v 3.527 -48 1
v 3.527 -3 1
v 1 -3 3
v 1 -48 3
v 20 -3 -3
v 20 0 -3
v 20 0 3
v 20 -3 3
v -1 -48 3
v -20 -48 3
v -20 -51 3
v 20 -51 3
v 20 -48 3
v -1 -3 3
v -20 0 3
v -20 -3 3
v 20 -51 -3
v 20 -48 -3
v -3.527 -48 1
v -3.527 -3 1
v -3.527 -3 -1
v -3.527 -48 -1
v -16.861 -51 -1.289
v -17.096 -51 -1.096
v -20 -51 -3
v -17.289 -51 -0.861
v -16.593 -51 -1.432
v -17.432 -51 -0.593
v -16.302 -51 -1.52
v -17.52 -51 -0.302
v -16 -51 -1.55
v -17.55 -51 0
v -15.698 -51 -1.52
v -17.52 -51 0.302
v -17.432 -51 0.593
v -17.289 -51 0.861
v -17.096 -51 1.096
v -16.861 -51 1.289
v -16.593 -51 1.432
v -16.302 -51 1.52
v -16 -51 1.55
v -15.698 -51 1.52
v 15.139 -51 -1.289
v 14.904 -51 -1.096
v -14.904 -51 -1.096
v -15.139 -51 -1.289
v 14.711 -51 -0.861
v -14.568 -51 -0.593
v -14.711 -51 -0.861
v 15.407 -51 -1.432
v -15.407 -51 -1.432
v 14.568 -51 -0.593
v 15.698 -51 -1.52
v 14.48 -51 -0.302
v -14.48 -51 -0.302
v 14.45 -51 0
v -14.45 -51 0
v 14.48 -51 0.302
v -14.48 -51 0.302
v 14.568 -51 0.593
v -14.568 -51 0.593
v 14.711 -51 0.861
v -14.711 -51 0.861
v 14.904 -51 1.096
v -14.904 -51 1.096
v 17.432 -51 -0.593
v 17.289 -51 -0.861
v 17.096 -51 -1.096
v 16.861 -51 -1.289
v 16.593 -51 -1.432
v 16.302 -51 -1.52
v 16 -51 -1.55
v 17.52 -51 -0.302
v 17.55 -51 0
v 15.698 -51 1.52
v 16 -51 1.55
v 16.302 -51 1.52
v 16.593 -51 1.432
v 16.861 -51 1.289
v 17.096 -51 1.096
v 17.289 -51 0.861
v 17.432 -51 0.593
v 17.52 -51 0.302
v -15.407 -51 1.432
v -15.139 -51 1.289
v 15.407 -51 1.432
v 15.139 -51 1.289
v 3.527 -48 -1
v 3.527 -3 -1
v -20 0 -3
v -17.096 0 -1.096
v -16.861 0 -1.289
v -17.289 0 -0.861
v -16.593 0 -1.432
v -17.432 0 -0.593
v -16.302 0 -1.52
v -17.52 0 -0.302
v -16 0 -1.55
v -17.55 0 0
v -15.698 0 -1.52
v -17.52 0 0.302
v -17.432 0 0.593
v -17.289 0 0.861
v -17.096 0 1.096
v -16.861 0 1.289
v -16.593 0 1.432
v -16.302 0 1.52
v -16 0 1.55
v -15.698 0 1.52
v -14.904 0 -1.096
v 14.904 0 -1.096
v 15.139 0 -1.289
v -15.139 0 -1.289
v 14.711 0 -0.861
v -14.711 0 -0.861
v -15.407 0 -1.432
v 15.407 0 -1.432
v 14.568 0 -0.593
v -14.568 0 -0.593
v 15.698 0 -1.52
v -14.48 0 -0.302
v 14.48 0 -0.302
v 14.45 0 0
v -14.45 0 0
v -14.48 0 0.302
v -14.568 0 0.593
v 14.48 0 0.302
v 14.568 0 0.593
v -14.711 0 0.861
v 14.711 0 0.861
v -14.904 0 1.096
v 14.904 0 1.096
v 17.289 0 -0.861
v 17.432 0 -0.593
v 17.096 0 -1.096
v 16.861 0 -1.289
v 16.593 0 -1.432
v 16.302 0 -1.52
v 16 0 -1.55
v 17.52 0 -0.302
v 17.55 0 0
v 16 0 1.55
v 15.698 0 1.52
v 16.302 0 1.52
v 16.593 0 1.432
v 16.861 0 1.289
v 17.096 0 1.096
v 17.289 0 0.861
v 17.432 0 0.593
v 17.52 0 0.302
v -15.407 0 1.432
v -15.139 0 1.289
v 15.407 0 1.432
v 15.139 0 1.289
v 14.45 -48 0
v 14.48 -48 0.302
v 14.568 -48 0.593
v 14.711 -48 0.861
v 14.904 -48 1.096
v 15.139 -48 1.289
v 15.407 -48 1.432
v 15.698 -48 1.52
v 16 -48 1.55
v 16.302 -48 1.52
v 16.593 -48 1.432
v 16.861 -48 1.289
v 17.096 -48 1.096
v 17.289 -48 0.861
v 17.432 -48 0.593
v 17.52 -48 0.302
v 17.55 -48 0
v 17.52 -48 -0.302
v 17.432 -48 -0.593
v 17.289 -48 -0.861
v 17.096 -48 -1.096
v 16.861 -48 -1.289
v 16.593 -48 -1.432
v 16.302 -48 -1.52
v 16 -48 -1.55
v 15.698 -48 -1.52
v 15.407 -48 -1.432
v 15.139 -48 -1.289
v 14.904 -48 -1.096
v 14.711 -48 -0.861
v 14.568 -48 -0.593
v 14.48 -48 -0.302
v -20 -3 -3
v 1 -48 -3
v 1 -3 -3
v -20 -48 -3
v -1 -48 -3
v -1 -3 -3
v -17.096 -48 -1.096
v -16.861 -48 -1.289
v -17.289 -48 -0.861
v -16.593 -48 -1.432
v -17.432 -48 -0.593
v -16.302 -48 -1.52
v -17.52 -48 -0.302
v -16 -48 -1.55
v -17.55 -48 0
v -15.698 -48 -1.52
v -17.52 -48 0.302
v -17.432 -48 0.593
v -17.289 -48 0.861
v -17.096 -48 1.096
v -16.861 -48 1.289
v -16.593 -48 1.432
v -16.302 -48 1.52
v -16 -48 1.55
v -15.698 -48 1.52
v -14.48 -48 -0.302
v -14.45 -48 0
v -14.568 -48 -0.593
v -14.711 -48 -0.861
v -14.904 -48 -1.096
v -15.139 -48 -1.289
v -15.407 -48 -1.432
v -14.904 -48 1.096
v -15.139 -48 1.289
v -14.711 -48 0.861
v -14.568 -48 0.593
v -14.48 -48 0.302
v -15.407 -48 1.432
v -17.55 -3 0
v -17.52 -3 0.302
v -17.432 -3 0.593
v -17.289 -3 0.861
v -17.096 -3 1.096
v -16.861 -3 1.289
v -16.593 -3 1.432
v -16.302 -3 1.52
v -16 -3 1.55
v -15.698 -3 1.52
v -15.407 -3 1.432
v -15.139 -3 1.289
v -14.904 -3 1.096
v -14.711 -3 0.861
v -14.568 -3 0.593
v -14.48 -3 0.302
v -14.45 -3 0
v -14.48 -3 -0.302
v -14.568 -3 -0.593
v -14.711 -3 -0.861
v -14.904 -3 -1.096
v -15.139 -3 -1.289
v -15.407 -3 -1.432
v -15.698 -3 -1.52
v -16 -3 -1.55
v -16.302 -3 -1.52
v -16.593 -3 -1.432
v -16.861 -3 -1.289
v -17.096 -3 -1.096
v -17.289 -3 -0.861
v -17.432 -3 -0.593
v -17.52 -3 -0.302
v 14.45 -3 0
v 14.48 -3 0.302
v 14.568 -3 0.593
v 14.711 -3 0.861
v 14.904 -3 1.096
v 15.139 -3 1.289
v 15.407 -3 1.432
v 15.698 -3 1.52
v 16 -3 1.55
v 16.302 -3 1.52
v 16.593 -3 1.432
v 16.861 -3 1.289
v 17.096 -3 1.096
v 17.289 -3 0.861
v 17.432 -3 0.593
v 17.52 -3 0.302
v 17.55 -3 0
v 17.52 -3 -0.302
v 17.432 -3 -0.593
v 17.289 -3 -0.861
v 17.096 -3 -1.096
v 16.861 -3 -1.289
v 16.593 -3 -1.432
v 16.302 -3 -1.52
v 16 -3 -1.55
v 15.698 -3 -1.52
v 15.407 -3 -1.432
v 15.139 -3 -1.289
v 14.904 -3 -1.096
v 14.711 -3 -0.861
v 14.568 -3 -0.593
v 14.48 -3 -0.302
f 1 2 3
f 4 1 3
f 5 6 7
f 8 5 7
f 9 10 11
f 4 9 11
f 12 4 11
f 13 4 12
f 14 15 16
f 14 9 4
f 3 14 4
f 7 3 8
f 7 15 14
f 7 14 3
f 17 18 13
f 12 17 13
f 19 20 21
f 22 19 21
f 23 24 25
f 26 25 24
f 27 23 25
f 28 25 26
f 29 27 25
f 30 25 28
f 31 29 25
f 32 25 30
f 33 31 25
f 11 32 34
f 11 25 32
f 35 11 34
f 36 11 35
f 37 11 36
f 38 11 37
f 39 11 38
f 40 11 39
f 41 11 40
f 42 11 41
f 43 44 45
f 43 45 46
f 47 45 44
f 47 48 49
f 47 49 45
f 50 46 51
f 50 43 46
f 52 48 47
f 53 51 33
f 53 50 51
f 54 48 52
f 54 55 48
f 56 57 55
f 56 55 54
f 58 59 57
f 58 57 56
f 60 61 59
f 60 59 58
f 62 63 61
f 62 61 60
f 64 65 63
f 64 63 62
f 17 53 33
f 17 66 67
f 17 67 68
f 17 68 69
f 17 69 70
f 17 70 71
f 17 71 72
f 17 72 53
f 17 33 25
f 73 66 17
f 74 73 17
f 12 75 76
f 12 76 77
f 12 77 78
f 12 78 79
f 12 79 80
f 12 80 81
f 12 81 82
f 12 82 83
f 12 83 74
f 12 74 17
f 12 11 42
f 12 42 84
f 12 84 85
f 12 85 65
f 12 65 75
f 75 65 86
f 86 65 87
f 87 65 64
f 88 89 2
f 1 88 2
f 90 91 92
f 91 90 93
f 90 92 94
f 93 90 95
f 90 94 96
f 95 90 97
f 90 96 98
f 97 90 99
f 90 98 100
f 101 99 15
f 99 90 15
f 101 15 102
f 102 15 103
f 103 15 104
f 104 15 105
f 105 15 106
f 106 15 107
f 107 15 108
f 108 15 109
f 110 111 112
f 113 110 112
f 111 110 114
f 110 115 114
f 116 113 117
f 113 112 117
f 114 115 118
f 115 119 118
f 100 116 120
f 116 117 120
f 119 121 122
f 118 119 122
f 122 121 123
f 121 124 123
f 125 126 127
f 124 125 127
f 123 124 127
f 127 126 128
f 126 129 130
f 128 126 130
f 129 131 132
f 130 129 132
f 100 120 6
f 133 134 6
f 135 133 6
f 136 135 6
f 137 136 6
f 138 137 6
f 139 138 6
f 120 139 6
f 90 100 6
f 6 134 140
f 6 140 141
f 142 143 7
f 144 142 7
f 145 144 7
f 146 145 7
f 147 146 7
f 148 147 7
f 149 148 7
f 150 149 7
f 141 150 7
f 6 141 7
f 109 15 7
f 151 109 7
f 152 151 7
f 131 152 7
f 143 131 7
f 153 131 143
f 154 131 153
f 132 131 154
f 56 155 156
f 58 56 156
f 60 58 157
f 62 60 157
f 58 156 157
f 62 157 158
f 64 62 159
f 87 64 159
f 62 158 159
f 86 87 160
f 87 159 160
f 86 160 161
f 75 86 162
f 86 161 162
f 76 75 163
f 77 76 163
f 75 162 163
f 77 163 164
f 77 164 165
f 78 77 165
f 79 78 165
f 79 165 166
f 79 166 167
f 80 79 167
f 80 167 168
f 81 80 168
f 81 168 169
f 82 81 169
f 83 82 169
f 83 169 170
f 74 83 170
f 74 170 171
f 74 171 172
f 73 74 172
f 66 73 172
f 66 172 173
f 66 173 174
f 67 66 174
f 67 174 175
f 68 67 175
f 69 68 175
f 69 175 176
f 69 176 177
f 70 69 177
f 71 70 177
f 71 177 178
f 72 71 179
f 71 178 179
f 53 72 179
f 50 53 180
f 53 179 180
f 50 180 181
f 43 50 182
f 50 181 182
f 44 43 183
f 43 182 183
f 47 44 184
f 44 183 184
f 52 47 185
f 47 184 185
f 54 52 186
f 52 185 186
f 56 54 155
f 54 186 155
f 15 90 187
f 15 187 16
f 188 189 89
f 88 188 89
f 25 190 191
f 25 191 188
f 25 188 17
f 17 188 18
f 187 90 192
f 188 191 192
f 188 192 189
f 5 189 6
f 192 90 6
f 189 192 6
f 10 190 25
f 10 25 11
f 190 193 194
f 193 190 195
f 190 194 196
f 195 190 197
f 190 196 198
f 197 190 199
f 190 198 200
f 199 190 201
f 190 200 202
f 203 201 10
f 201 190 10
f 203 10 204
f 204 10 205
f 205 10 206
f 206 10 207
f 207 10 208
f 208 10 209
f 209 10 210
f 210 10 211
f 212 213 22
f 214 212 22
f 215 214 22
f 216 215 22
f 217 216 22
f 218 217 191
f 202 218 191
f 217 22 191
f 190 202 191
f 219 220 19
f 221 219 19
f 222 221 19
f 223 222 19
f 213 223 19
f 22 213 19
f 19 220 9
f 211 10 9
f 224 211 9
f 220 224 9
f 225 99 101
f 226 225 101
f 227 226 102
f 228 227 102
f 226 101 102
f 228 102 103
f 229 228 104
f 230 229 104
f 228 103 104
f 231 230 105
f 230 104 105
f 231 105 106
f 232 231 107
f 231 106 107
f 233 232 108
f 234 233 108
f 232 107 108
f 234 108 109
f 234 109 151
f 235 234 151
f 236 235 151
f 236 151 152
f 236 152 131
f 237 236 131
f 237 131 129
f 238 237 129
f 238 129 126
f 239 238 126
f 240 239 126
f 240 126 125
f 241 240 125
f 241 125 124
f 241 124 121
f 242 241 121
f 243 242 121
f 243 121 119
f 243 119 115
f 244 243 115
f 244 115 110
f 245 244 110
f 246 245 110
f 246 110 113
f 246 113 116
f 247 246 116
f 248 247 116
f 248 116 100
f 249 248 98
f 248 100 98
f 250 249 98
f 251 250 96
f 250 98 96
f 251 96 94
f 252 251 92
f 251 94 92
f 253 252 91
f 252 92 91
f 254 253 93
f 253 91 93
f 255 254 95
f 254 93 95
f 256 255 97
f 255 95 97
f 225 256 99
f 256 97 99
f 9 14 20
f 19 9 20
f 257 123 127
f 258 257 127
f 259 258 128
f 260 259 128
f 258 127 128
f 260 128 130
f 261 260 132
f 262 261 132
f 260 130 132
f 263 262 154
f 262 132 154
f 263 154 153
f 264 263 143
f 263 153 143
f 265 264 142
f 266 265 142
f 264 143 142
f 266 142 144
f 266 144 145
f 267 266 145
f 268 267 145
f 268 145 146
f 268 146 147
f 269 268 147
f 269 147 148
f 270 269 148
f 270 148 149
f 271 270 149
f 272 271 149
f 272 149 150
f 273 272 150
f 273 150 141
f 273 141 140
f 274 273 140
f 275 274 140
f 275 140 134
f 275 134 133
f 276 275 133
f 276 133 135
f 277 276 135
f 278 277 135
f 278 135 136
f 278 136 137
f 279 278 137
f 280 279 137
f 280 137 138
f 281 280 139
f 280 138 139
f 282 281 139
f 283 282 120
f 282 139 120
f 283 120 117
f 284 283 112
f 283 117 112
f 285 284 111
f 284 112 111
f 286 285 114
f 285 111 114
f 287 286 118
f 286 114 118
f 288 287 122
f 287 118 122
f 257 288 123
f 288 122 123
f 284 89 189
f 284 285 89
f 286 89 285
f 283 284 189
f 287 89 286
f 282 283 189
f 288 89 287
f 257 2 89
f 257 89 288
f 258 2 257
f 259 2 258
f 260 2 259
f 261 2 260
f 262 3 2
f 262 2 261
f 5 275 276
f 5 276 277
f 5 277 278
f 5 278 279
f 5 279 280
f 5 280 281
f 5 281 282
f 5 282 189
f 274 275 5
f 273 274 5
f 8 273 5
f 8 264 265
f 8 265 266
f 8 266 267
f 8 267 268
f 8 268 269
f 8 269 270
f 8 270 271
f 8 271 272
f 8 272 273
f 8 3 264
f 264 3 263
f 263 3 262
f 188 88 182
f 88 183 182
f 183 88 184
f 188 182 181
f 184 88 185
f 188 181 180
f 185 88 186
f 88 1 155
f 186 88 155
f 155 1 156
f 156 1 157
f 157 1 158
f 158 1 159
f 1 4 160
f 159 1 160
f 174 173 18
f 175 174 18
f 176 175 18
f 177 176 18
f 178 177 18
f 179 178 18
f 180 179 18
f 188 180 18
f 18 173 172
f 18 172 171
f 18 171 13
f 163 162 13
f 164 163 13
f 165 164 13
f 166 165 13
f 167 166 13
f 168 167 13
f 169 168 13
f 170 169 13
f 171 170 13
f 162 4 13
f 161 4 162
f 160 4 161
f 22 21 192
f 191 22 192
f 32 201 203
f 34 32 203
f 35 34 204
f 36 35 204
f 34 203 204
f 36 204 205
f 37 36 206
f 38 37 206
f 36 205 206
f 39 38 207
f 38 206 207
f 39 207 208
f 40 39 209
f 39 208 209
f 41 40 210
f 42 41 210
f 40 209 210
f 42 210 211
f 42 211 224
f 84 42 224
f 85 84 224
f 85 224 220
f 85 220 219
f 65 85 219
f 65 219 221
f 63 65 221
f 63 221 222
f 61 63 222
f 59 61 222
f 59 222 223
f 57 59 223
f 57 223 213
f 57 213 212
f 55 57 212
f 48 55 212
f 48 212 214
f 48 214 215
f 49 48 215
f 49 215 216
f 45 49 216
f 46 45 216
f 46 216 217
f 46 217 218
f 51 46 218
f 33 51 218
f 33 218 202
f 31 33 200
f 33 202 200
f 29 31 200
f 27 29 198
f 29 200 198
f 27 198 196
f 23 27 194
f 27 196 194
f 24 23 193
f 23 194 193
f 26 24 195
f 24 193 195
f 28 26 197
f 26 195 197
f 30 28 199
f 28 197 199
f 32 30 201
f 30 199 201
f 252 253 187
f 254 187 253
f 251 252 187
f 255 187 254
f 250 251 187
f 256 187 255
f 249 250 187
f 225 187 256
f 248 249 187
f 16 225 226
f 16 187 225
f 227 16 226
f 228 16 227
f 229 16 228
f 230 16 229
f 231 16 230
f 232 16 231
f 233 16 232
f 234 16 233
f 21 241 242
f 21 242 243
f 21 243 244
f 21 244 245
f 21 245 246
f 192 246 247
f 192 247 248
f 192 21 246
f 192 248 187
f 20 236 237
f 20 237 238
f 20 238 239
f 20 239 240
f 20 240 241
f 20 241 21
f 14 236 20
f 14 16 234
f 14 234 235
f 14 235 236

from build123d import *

# Parameters (mm, degrees)
F0_W     = 40
F0_H     = 6
F1_DEPTH = 3
F3_DEPTH = 45
F4_W     = 40
F4_H     = 6
F5_DEPTH = 3
F6_R     = 1.55
F7_DEPTH = 51.001


with BuildPart() as f1:
    # F0 (on Front) → F1 (new body)
    with BuildSketch(Plane.XZ):
        Rectangle(F0_W, F0_H)
    extrude(amount=F1_DEPTH)

    # F2 (on face) → F3 (join)
    with BuildSketch(Plane.XZ.offset(3)):
        Polygon((1, -3), (3.527162, -1), (3.527162, 1), (1, 3), (-1, 3), (-3.527162, 1), (-3.527162, -1), (-1, -3), align=None)
    extrude(amount=F3_DEPTH)

    # F4 (on face) → F5 (join)
    with BuildSketch(Plane.XZ.offset(48)):
        Rectangle(F4_W, F4_H)
    extrude(amount=F5_DEPTH)

    # F6 (on face) → F7 (cut, through all)
    with BuildSketch(Plane(origin=(0, 0, 0), x_dir=(-1, 0, 0), z_dir=(0, 1, 0))):
        with Locations((-16, 0)):
            Circle(F6_R)
        with Locations((16, 0)):
            Circle(F6_R)
    extrude(amount=-F7_DEPTH, mode=Mode.SUBTRACT)


solid = f1.part
